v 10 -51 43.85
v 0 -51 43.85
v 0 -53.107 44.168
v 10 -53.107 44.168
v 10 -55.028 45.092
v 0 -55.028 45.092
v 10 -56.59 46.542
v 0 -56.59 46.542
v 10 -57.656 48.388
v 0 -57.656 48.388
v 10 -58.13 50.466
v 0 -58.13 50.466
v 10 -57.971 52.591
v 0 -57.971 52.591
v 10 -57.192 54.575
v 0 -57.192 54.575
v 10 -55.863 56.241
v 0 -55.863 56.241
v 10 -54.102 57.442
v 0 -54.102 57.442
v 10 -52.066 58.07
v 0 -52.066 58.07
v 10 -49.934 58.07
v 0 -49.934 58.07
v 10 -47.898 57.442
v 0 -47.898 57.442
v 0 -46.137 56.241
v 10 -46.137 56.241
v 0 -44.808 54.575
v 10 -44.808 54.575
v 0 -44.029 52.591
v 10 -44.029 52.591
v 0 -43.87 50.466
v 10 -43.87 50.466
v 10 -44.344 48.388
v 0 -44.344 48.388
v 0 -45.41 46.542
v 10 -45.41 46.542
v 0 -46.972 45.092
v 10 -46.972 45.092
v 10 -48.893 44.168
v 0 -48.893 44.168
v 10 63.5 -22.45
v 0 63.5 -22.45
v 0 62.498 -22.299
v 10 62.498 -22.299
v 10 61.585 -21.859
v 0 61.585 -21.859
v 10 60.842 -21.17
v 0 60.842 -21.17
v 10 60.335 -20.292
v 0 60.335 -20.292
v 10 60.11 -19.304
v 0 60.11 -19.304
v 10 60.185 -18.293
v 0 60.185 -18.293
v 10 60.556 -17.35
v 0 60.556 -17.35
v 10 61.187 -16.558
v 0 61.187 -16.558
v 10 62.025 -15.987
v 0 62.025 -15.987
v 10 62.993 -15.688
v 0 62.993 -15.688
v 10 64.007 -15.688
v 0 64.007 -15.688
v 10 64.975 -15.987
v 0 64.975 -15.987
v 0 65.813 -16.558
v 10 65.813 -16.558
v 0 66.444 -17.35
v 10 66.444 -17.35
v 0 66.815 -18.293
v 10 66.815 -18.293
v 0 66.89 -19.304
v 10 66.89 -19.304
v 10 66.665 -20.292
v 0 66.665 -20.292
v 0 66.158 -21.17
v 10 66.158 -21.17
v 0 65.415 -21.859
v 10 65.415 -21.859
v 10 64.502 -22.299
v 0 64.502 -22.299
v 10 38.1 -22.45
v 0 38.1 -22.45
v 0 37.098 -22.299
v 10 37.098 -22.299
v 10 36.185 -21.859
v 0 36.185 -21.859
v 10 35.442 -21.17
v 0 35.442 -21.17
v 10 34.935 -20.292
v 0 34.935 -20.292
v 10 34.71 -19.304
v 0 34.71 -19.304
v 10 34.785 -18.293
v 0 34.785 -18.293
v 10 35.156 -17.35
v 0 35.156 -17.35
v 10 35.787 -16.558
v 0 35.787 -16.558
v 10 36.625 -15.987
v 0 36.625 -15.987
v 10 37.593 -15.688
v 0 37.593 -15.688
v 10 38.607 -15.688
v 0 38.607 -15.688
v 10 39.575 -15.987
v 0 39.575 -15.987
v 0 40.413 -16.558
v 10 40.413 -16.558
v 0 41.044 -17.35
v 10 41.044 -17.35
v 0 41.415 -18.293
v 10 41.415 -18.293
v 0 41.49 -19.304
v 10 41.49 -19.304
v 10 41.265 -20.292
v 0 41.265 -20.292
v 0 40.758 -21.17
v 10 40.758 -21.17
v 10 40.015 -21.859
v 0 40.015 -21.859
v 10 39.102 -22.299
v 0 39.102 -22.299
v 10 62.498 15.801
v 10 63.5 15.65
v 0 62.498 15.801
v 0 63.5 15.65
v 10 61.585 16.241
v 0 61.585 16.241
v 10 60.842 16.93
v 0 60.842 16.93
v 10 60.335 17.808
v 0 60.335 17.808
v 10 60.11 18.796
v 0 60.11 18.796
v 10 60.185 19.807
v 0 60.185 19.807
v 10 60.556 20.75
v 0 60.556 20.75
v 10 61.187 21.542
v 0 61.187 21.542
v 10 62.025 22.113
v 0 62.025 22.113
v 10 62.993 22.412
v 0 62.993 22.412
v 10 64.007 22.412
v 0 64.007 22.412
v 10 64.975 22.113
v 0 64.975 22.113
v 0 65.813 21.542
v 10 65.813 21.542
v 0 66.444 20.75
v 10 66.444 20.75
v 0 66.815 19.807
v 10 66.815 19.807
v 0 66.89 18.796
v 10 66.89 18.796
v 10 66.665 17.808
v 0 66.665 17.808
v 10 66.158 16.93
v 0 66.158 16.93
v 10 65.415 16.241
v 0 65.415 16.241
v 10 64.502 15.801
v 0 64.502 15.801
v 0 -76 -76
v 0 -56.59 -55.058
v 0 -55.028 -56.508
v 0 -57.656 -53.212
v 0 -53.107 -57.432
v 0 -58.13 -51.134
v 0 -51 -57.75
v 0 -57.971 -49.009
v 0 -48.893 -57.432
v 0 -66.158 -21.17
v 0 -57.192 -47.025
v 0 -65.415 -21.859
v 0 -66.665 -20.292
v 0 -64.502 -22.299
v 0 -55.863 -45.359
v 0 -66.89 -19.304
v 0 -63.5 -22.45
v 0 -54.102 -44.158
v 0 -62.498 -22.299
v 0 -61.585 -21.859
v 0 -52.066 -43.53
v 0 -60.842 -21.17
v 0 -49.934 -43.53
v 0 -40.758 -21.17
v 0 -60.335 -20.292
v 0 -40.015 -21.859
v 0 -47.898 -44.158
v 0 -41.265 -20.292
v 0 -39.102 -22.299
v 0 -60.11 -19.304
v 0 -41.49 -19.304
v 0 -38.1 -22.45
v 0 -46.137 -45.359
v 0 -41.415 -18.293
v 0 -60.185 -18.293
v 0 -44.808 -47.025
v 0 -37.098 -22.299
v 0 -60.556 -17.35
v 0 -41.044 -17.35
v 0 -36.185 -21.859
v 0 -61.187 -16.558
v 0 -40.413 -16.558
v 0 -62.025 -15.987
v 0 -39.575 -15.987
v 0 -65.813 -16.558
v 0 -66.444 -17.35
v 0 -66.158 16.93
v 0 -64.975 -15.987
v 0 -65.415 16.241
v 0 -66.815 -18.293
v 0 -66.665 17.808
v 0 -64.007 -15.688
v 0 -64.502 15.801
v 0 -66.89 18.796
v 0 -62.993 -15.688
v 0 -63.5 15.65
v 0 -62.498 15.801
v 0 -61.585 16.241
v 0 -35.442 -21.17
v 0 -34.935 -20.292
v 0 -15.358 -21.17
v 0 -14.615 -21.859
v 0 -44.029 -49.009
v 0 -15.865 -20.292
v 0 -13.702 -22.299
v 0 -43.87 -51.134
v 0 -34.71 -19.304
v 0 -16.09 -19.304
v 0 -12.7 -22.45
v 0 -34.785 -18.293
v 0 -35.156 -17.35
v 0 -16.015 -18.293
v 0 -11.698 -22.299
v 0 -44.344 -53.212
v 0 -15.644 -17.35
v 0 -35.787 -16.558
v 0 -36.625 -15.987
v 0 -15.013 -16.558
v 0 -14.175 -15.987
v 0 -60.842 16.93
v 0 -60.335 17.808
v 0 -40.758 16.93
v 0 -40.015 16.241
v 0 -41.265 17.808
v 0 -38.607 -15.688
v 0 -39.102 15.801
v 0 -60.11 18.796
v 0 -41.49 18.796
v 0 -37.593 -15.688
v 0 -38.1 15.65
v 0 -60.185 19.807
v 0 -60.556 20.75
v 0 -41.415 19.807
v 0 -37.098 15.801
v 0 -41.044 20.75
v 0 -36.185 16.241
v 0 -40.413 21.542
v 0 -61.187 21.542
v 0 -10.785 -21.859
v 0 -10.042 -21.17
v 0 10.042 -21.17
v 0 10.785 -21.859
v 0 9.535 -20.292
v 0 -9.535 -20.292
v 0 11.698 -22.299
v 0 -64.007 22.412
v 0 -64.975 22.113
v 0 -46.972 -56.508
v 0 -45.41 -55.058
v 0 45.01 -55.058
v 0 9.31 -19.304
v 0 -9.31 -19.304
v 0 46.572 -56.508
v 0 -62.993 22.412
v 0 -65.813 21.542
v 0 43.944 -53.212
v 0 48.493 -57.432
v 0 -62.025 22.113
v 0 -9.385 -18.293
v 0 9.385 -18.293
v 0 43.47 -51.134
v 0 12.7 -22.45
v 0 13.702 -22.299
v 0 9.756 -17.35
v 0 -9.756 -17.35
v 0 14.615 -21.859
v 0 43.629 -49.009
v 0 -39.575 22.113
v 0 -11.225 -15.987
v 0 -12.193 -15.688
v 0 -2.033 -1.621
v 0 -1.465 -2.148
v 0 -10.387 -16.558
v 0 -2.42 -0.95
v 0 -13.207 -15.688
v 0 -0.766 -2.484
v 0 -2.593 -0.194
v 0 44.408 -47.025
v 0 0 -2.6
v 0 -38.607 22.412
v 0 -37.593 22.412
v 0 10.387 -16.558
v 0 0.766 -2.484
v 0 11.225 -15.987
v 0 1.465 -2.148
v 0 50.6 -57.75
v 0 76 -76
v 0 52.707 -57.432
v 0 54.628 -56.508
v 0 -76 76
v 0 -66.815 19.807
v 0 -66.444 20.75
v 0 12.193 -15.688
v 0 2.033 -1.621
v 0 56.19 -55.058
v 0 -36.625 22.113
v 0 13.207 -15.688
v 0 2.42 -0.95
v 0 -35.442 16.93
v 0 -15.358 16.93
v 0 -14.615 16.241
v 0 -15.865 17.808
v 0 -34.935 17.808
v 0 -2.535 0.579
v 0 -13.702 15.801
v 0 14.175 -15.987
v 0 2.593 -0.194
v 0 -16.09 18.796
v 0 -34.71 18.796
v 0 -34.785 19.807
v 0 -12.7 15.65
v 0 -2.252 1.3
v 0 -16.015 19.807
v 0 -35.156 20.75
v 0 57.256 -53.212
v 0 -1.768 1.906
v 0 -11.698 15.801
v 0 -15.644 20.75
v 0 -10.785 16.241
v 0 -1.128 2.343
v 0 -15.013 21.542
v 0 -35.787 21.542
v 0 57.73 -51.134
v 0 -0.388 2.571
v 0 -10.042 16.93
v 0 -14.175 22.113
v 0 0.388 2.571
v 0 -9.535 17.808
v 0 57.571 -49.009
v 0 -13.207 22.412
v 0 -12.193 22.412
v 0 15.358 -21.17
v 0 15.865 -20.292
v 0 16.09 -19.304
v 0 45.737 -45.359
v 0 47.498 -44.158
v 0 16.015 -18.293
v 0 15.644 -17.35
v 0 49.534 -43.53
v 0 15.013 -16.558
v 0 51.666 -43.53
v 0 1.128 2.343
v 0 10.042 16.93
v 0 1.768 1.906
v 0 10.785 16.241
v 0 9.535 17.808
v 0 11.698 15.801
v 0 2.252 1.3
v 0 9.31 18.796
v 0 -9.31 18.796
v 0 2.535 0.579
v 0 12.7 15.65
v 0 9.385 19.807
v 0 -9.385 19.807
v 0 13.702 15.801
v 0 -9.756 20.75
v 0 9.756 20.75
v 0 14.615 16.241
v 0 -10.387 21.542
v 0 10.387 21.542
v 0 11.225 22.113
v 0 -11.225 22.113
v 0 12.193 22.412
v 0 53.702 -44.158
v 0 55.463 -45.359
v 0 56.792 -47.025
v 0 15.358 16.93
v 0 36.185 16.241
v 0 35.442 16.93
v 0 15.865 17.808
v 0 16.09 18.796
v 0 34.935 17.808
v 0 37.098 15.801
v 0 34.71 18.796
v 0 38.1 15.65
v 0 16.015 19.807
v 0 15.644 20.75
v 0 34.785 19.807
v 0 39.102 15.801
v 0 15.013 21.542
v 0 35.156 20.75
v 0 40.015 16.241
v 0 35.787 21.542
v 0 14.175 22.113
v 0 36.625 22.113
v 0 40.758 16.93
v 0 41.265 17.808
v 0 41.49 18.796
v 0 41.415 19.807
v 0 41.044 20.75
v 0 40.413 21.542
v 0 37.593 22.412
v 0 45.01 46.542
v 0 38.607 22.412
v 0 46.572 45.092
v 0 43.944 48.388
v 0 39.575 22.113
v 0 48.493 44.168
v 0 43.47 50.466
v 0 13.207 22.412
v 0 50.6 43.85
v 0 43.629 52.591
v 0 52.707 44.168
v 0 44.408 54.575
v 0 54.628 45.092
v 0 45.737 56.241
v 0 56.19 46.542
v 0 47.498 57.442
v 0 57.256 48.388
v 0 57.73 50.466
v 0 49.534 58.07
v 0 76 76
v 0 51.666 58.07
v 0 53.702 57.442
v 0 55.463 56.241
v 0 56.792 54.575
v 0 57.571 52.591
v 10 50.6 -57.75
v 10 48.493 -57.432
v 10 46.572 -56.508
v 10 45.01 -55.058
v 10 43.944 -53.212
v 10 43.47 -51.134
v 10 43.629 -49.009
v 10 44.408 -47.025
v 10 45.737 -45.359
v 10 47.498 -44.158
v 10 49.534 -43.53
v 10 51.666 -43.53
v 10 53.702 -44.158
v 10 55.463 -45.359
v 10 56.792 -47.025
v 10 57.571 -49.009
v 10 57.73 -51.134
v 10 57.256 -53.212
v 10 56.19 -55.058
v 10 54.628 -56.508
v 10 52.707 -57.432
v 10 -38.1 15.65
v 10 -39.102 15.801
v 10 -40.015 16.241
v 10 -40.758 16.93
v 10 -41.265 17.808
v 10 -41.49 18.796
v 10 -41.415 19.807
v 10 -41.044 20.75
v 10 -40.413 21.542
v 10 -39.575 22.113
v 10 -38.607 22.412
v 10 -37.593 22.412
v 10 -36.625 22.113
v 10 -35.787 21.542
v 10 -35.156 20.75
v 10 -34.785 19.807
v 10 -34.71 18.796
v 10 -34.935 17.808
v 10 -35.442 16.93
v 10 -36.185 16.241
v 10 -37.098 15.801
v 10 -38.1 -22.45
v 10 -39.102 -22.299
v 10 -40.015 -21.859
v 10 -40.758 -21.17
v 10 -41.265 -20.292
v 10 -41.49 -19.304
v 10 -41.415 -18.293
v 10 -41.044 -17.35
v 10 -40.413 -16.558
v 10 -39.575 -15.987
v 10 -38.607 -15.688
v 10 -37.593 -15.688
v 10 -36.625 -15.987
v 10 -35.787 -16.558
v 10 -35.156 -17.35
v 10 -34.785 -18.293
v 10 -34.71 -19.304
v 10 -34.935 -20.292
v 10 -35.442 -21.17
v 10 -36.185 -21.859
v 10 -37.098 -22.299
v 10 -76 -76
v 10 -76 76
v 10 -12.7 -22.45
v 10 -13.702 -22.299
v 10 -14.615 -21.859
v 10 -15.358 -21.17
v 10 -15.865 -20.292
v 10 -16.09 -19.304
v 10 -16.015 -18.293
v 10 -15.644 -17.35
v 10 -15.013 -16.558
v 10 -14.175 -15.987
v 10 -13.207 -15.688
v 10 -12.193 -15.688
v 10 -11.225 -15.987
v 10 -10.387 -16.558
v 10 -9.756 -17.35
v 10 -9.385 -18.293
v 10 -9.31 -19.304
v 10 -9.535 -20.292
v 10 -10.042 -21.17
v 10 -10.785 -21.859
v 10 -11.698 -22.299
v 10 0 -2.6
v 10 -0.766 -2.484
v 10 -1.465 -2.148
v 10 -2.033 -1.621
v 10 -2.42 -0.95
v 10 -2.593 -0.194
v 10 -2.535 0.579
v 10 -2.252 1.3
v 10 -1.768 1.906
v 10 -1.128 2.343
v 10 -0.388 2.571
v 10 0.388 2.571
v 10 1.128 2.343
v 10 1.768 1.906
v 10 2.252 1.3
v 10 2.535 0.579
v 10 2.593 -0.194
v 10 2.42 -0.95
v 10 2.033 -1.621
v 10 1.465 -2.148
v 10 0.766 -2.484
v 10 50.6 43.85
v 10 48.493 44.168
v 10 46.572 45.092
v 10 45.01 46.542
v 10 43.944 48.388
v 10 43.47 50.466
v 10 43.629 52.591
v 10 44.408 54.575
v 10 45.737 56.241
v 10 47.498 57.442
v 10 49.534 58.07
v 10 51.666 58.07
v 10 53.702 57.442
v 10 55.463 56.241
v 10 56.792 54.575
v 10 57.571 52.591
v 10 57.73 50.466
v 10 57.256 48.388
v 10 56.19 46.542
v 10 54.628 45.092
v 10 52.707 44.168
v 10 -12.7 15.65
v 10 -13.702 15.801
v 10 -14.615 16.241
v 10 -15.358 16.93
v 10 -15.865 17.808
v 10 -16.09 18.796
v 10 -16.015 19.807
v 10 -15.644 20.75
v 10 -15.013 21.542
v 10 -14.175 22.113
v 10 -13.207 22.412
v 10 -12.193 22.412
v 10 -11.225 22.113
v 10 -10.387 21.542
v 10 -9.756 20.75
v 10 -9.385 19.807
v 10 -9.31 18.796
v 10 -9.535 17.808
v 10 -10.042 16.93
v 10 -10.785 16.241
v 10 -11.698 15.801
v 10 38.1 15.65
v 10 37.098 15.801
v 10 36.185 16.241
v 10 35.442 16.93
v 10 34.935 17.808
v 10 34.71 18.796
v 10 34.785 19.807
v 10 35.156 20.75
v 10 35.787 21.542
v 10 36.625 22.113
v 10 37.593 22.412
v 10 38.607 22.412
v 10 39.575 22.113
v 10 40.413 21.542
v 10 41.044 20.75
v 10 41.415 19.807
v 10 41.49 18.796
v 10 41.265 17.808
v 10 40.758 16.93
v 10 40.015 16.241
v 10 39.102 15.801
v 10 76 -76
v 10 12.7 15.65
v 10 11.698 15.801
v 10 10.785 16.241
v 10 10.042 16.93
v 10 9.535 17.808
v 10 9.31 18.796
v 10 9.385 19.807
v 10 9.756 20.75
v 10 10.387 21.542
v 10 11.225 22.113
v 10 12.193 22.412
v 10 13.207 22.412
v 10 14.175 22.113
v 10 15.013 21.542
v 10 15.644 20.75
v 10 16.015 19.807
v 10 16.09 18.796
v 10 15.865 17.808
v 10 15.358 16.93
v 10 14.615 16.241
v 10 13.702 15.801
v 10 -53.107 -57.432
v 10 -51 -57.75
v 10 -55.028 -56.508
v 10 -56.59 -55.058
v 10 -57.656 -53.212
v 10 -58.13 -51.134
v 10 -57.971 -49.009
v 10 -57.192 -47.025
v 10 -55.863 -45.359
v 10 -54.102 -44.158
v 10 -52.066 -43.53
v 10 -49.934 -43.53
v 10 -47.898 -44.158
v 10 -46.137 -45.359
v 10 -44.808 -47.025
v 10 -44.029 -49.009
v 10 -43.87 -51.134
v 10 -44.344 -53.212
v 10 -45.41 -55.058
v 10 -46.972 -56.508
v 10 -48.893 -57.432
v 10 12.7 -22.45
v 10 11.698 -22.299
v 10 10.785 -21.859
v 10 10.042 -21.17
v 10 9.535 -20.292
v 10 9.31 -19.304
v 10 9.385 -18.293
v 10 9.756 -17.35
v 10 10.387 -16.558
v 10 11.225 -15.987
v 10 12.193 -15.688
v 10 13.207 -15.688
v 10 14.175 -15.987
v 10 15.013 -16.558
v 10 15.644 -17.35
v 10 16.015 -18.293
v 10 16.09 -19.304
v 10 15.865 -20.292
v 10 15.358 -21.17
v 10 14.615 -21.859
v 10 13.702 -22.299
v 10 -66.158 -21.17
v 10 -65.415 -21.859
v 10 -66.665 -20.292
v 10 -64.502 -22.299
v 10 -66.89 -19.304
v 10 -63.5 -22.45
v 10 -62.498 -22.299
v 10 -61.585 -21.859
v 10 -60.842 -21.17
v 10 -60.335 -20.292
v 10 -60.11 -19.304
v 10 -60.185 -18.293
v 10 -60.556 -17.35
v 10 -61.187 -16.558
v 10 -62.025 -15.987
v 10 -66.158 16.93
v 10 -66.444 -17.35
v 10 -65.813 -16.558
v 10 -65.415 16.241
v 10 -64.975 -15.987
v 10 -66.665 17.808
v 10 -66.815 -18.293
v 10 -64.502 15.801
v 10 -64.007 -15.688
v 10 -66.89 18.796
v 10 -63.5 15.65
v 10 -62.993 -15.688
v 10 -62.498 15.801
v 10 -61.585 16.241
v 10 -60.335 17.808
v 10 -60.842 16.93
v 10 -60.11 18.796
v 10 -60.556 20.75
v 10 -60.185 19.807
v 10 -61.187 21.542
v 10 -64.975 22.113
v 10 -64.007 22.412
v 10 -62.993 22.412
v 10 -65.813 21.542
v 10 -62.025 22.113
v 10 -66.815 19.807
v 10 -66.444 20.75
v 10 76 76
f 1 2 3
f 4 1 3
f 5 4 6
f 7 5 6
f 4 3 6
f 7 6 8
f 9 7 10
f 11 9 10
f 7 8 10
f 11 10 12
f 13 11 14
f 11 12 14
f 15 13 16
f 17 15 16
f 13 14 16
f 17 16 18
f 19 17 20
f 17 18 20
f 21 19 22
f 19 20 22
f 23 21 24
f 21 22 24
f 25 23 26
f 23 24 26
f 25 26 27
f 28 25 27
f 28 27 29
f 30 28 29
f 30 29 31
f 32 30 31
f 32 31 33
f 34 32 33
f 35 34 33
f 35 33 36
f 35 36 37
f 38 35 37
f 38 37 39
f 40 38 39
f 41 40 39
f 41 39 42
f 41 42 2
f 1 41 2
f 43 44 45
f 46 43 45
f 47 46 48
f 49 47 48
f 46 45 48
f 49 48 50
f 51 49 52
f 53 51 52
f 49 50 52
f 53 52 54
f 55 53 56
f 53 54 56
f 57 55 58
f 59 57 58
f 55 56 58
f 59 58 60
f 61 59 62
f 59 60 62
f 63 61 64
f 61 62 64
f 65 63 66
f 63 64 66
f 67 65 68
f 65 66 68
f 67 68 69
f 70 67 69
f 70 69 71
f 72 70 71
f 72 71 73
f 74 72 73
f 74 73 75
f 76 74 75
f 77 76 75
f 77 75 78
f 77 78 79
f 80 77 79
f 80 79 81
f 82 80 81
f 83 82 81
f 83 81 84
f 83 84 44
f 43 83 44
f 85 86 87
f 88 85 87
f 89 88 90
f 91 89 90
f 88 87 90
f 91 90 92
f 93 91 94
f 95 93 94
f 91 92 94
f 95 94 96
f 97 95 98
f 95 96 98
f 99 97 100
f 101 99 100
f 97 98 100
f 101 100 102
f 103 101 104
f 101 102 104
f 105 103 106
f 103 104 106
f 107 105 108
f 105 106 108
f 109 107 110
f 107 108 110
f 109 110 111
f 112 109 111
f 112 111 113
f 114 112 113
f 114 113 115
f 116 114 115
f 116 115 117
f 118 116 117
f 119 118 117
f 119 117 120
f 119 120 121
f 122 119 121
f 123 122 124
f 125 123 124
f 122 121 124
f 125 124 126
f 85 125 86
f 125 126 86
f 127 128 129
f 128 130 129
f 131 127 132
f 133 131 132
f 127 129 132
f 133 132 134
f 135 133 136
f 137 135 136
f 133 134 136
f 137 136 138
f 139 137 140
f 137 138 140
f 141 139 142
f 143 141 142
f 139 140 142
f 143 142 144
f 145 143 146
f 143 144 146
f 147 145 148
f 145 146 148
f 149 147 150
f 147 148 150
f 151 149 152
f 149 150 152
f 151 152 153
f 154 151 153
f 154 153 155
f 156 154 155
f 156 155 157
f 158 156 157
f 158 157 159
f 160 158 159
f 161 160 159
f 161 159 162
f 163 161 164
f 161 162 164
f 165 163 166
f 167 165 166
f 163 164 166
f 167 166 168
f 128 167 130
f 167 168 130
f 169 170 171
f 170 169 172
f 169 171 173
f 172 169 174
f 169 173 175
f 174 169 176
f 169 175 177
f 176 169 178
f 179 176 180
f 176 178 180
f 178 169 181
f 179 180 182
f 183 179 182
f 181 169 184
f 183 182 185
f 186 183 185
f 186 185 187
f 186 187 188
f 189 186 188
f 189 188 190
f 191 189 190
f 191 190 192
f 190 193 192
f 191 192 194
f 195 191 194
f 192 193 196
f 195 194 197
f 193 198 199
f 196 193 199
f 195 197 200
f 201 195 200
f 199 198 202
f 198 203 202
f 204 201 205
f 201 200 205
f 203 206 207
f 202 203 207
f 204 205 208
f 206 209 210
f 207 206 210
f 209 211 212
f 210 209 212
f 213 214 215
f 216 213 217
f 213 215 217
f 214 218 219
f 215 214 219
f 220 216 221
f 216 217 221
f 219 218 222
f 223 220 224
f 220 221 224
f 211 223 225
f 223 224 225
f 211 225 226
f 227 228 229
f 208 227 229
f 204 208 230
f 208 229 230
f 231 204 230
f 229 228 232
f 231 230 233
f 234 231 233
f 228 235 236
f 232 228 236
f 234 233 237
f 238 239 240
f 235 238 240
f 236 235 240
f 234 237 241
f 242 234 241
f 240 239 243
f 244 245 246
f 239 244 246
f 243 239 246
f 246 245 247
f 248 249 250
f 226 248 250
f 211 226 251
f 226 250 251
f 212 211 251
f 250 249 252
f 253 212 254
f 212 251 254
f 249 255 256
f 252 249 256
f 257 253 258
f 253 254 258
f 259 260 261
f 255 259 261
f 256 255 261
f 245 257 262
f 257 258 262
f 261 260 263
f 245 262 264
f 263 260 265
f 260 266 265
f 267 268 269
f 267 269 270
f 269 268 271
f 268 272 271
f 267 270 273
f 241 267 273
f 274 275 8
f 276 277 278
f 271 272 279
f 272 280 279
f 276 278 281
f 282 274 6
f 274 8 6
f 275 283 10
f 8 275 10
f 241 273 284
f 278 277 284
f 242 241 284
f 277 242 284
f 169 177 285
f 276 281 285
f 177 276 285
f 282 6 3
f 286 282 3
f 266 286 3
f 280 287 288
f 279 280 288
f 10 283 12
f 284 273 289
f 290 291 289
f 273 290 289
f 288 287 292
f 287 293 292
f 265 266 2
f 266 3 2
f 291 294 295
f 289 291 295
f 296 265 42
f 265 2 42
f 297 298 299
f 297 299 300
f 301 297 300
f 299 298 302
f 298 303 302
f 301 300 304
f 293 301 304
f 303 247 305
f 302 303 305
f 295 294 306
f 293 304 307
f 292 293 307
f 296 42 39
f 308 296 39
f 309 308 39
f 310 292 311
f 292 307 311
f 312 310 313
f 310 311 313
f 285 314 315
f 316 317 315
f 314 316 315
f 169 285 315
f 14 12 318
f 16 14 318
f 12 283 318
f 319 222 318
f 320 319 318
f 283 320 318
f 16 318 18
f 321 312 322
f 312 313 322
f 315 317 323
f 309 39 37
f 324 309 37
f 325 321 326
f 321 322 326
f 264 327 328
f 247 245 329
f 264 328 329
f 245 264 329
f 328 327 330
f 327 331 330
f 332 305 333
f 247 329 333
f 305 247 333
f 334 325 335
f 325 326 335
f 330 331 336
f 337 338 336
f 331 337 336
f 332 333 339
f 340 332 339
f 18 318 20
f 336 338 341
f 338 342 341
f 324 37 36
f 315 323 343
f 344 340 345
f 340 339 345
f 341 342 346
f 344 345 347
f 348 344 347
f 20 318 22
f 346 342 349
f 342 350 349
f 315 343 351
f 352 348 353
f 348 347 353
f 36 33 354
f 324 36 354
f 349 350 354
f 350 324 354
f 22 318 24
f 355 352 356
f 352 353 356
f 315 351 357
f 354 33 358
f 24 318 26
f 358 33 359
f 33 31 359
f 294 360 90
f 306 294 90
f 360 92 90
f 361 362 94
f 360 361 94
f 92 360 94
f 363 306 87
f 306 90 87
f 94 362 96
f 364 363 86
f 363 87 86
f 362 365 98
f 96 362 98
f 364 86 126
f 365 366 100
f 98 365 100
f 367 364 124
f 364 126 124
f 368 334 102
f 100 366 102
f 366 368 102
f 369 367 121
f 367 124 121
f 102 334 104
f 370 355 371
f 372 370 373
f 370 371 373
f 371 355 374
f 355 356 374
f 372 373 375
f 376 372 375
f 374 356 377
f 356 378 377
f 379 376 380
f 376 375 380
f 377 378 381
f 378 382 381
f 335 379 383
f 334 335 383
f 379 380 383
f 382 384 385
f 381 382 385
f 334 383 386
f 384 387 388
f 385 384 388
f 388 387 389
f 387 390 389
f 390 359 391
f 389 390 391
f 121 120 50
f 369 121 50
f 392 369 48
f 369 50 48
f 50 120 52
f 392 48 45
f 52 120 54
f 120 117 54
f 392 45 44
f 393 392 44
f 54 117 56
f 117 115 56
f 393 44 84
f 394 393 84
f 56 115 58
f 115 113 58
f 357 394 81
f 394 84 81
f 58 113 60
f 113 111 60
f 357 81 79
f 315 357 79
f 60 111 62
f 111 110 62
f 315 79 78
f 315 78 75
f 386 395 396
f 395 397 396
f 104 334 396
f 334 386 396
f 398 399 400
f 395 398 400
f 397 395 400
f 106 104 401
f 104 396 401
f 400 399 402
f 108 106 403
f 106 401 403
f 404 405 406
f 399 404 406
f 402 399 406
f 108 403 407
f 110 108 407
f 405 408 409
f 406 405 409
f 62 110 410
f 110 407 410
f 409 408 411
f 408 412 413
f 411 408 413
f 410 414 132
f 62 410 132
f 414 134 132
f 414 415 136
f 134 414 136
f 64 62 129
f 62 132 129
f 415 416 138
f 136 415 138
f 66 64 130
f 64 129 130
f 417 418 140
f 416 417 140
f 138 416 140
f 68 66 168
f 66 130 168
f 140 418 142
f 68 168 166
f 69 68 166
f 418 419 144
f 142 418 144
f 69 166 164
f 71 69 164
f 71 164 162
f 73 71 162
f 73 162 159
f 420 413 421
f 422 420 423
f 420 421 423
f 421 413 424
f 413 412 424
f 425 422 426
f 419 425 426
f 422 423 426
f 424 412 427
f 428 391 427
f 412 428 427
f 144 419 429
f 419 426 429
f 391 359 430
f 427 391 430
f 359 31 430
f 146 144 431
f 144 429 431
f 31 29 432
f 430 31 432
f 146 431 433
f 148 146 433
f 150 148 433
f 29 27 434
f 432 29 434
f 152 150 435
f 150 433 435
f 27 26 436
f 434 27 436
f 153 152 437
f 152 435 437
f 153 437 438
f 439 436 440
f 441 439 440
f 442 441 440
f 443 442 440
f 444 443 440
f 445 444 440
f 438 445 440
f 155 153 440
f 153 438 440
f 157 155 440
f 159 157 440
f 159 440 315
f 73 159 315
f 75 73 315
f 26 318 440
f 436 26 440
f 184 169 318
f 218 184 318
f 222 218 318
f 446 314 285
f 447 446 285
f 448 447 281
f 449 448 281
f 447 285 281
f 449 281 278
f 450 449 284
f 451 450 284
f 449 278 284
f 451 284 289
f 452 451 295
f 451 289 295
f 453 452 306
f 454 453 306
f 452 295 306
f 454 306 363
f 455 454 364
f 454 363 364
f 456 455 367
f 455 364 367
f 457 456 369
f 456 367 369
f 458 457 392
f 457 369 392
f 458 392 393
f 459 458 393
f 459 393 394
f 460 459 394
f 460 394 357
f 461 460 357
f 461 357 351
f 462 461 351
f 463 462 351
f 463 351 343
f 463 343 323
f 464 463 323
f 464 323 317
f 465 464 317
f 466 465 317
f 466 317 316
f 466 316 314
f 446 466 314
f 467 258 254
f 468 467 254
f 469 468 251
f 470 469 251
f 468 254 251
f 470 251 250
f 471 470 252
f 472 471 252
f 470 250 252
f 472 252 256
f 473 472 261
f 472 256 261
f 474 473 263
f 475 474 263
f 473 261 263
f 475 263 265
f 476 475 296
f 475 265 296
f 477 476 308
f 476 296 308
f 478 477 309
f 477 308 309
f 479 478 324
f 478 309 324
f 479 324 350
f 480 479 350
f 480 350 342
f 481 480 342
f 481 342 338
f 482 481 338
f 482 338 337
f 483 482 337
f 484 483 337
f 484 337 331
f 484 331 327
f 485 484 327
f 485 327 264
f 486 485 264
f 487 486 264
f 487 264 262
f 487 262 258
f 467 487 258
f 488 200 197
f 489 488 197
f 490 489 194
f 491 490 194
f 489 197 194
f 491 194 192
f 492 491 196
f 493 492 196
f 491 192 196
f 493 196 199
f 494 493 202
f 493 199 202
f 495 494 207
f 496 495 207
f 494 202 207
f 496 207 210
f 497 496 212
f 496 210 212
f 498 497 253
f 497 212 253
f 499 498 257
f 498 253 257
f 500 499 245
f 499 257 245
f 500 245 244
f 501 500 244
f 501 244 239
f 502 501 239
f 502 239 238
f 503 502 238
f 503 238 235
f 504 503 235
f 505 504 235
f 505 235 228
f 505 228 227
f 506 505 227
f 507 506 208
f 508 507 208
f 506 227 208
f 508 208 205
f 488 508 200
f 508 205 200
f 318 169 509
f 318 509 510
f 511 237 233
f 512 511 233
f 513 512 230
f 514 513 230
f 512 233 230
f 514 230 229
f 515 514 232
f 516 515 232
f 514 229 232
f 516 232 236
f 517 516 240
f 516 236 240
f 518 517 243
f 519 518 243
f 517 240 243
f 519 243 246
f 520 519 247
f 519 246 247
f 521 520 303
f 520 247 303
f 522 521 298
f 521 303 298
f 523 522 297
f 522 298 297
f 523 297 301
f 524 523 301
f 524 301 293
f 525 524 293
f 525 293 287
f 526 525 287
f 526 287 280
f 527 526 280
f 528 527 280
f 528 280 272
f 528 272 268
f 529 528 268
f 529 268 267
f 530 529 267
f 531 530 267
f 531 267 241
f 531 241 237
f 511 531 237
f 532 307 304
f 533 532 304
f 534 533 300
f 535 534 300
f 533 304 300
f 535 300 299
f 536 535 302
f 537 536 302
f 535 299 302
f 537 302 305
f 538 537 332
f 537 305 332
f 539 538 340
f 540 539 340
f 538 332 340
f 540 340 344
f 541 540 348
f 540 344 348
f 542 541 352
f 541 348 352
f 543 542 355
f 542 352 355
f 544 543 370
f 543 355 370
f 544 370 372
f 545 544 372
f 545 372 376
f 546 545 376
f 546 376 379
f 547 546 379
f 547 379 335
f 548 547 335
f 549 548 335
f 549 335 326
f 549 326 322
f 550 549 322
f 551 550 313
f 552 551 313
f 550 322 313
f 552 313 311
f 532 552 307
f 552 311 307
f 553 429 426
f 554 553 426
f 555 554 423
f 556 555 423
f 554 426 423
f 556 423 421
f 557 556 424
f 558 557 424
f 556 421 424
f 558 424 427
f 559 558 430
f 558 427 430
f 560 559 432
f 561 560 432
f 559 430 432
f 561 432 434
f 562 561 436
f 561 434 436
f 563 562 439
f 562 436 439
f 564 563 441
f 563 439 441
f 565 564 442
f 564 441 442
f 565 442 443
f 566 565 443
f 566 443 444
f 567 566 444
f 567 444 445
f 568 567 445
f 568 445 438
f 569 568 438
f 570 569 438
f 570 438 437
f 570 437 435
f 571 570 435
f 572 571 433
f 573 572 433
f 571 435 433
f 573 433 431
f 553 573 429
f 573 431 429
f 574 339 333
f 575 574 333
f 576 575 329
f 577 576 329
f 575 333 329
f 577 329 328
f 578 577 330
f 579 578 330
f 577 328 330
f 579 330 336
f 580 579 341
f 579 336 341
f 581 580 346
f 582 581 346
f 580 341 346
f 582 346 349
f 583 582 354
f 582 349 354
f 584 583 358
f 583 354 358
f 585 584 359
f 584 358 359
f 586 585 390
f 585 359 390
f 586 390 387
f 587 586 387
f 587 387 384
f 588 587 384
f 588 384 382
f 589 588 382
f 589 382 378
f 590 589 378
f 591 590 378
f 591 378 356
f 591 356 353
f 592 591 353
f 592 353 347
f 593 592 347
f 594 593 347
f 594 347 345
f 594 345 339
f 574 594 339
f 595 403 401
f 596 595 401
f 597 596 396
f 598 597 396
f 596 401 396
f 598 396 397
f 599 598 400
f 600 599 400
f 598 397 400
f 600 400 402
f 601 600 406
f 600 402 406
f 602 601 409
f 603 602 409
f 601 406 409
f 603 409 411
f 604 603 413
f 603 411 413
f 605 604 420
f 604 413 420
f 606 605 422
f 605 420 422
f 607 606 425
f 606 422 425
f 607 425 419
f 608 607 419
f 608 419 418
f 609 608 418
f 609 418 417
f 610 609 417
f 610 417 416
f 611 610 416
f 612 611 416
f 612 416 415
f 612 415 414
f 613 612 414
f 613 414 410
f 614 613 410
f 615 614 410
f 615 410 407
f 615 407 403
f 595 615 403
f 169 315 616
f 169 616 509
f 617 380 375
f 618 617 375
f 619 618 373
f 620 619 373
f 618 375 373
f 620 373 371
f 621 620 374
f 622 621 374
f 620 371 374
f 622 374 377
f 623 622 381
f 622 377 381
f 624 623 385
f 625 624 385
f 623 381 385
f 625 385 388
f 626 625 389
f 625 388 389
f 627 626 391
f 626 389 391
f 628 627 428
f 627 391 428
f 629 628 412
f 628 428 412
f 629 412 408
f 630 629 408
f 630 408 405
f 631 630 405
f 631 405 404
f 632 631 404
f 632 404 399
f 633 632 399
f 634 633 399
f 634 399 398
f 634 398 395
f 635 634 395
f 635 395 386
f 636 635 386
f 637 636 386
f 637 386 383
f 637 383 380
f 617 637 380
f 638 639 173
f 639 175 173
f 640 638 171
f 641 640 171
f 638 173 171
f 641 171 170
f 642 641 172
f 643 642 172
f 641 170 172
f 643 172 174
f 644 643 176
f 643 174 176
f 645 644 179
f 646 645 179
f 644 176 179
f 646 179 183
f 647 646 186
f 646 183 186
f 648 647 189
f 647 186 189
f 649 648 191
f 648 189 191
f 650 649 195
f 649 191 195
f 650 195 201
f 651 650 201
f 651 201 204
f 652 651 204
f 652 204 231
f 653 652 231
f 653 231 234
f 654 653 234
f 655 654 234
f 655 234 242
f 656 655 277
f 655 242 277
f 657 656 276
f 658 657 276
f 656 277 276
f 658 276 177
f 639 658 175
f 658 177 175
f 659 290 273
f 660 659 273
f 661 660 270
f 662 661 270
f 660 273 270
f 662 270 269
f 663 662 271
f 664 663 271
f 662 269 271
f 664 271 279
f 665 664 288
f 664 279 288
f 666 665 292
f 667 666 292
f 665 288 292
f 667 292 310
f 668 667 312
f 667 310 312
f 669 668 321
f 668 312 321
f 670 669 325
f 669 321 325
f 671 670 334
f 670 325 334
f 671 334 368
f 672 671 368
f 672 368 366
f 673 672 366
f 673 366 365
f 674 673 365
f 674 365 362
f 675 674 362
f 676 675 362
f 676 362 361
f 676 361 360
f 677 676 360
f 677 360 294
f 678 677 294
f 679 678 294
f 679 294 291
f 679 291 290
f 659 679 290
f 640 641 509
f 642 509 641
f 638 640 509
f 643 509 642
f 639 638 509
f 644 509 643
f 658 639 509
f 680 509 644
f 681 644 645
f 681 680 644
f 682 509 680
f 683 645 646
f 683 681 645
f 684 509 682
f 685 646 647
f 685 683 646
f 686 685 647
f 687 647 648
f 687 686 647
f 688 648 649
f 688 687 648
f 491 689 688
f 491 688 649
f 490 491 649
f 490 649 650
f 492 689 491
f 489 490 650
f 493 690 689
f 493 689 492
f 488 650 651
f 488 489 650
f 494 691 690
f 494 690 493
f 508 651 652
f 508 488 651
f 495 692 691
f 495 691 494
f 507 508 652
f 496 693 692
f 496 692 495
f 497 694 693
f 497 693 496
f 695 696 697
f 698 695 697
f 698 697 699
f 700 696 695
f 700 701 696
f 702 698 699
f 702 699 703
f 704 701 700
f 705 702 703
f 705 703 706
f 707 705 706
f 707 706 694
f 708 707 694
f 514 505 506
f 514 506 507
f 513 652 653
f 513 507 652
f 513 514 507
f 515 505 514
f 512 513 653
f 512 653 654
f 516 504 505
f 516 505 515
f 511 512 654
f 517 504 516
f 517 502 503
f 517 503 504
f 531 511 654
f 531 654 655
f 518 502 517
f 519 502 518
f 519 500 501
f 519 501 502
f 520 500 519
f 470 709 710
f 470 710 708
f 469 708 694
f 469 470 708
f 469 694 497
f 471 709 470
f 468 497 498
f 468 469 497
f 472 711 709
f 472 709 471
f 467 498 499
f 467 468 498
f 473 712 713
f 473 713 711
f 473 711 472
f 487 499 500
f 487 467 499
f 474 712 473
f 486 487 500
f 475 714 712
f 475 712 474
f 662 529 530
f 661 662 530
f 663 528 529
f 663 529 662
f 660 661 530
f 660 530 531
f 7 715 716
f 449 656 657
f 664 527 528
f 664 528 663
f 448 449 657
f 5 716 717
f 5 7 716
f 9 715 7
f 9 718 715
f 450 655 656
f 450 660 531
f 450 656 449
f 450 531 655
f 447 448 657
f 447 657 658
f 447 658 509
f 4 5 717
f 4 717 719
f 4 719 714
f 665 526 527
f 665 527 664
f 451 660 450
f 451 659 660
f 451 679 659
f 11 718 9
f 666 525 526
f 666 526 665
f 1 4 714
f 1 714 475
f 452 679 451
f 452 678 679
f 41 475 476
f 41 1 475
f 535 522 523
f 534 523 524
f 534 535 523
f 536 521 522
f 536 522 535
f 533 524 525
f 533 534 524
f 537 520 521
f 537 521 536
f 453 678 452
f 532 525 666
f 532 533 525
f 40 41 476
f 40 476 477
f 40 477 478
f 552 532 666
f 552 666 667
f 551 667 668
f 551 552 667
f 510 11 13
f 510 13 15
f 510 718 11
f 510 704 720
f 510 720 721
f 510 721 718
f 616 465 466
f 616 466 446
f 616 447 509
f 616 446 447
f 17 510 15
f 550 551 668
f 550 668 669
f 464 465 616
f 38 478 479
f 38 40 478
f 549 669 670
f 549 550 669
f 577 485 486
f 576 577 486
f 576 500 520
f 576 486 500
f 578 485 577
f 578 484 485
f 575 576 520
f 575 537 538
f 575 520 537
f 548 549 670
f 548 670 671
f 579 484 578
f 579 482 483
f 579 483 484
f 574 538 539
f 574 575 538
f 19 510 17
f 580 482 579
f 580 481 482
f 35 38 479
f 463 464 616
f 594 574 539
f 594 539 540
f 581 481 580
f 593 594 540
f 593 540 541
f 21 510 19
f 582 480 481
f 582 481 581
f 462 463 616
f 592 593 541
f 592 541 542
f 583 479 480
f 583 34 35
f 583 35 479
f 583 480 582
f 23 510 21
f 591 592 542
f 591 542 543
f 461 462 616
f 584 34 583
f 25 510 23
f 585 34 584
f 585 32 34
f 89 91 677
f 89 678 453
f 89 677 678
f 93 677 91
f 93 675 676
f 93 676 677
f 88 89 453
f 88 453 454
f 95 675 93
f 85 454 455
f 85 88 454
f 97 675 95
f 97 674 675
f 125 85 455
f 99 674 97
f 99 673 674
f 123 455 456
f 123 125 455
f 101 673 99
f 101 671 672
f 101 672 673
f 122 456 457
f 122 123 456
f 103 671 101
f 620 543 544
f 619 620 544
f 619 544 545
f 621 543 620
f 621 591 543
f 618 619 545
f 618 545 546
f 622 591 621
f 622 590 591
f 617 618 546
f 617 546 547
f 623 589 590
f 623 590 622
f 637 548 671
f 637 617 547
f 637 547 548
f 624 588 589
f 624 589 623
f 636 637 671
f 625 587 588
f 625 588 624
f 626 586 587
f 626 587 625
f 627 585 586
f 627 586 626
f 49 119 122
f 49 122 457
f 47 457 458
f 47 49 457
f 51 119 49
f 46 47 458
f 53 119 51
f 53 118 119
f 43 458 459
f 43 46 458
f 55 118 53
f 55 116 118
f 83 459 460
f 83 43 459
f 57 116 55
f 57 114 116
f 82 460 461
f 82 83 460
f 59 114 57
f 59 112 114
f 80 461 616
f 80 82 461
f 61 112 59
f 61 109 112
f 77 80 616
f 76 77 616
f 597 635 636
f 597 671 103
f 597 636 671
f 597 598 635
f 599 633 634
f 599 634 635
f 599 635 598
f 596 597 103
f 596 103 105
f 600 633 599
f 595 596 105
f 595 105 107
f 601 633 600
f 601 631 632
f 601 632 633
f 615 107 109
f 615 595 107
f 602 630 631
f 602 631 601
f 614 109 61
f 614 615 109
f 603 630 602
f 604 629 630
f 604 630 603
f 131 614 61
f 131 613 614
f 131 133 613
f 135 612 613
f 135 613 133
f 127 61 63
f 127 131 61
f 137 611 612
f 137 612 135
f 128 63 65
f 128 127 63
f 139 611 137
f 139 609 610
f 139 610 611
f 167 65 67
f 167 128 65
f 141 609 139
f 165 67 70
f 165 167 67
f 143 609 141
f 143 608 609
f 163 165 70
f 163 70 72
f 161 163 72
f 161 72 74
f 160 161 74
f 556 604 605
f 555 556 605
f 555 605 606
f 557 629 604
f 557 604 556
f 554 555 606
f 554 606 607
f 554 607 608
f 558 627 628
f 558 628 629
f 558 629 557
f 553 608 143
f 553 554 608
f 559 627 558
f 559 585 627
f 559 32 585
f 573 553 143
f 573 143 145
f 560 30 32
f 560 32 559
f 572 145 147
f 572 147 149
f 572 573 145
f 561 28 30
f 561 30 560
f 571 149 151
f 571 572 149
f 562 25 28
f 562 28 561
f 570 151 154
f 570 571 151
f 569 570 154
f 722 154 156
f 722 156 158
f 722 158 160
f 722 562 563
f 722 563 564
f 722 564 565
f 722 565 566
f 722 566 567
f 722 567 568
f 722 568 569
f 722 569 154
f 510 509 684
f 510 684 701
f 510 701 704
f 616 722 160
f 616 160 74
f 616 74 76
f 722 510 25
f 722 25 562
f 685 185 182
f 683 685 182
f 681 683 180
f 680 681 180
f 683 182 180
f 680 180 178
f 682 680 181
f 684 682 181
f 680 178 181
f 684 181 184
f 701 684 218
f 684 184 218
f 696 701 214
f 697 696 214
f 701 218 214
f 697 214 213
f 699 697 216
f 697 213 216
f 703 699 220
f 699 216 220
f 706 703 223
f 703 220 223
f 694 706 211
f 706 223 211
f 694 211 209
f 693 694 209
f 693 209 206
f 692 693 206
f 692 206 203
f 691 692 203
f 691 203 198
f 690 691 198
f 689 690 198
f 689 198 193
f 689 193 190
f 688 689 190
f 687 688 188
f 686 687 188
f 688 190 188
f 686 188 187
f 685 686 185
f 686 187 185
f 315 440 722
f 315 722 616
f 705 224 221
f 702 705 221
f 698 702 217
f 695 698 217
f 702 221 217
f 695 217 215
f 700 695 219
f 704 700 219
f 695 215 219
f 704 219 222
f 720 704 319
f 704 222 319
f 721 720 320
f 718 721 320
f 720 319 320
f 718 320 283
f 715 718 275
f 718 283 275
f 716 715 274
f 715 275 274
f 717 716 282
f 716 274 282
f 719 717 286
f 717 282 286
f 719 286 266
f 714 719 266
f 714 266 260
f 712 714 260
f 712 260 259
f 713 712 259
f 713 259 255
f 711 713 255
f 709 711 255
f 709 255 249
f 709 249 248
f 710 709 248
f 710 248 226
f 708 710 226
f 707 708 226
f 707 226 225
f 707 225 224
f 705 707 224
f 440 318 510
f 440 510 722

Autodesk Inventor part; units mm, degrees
ref_plane "YZ Plane" through (0, 0, 0) normal (1, 0, 0) x (0, 1, 0)
ref_plane "XZ Plane" through (0, 0, 0) normal (0, 1, 0) x (-1, 0, 0)
ref_plane "XY Plane" through (0, 0, 0) normal (0, 0, 1) x (1, 0, 0)
sketch "Sketch5" plane through (0, 0, 0) normal (1, 0, 0) x (0, 1, 0)
  line L0 (76, -76) -> (-76, -76)
  line L1 (-76, -76) -> (-76, 76)
  line L2 (-76, 76) -> (76, 76)
  line L3 (76, 76) -> (76, -76)
  line L4 (76, -76) -> (-76, 76) construction
  line L5 (-76, -76) -> (76, 76) construction
  point P0 (0, 0)
  dimension "d31" = 152
  dimension "d32" = 152
extrude "Extrusion2" add sketch "Sketch5" along normal blind 10
sketch "Sketch6" plane through (10, 0, 0) normal (1, 0, 0) x (0, 0, -1)
  line L0 (76, -76) -> (76, 76) projected
  line L1 (76, 76) -> (-76, 76) projected
  point P0 (0, 0)
  point P1 (50.6, 50.6)
  dimension "d42" = 25.4
  dimension "d43" = 25.4
hole "Hole4" at (10, 50.6, -50.6) direction (-1, 0, 0) diameter 14.3 end through all
sketch "Sketch7" plane through (10, 0, 0) normal (1, 0, 0) x (0, 0, -1)
  circle A0 centre (50.6, 50.6) radius 7.15 projected
  line L0 (76, 76) -> (-76, 76) projected
  point P0 (0, 0)
  point P1 (-51, 50.6)
  dimension "d51" = 101.6
  dimension "d52" = 25.4
hole "Hole5" at (10, 50.6, 51) direction (-1, 0, 0) diameter 14.3 end through all
sketch "Sketch8" plane through (10, 0, 0) normal (1, 0, 0) x (0, 0, -1)
  line L0 (76, -76) -> (76, 76) projected
  circle A0 centre (50.6, 50.6) radius 7.15 projected
  point P0 (0, 0)
  point P1 (50.6, -51)
  dimension "d60" = 25.4
  dimension "d61" = 101.6
hole "Hole6" at (10, -51, -50.6) direction (-1, 0, 0) diameter 14.3 end through all
sketch "Sketch9" plane through (10, 0, 0) normal (1, 0, 0) x (0, 0, -1)
  circle A0 centre (-51, 50.6) radius 7.15 projected
  circle A1 centre (50.6, -51) radius 7.15 projected
  point P0 (0, 0)
  point P1 (-51, -51)
  dimension "d69" = 101.6
  dimension "d70" = 101.6
hole "Hole7" at (10, -51, 51) direction (-1, 0, 0) diameter 14.3 end through all
sketch "Sketch10" plane through (10, 0, 0) normal (1, 0, 0) x (0, 0, -1)
  line L0 (76, 76) -> (-76, 76) projected
  line L1 (76, -76) -> (76, 76) projected
  point P0 (0, 0)
  point P1 (19.05, 63.5)
  dimension "d93" = 12.5
  dimension "d103" = 56.95
hole "Hole8" at (10, 63.5, -19.05) direction (-1, 0, 0) diameter 6.8 end through all
sketch "Sketch11" plane through (10, 0, 0) normal (1, 0, 0) x (0, 0, -1)
  circle A0 centre (19.05, 63.5) radius 3.4 projected
  point P0 (0, 0)
  point P1 (-19.05, 63.5)
  dimension "d85" = 38.1
  dimension "d86" = 0
hole "Hole9" at (10, 63.5, 19.05) direction (-1, 0, 0) diameter 6.8 end through all
pattern_linear "Rectangular Pattern1" count 6 spacing 25.4 along (0, -1, 0) of "Hole8"
pattern_linear "Rectangular Pattern2" count 6 spacing 25.4 along (0, -1, 0) of "Hole9"
sketch "Sketch12" plane through (10, 0, 0) normal (1, 0, 0) x (0, 0, -1)
  line L0 (76, -76) -> (76, 76) projected
  line L1 (-76, -76) -> (76, -76) projected
  point P0 (0, 0)
  point P1 (0, 0)
  dimension "d101" = 76
  dimension "d102" = 76
hole "Hole10" at (10, 0, 0) direction (-1, 0, 0) diameter 5.2 end through all
properties part number "base_plate"
